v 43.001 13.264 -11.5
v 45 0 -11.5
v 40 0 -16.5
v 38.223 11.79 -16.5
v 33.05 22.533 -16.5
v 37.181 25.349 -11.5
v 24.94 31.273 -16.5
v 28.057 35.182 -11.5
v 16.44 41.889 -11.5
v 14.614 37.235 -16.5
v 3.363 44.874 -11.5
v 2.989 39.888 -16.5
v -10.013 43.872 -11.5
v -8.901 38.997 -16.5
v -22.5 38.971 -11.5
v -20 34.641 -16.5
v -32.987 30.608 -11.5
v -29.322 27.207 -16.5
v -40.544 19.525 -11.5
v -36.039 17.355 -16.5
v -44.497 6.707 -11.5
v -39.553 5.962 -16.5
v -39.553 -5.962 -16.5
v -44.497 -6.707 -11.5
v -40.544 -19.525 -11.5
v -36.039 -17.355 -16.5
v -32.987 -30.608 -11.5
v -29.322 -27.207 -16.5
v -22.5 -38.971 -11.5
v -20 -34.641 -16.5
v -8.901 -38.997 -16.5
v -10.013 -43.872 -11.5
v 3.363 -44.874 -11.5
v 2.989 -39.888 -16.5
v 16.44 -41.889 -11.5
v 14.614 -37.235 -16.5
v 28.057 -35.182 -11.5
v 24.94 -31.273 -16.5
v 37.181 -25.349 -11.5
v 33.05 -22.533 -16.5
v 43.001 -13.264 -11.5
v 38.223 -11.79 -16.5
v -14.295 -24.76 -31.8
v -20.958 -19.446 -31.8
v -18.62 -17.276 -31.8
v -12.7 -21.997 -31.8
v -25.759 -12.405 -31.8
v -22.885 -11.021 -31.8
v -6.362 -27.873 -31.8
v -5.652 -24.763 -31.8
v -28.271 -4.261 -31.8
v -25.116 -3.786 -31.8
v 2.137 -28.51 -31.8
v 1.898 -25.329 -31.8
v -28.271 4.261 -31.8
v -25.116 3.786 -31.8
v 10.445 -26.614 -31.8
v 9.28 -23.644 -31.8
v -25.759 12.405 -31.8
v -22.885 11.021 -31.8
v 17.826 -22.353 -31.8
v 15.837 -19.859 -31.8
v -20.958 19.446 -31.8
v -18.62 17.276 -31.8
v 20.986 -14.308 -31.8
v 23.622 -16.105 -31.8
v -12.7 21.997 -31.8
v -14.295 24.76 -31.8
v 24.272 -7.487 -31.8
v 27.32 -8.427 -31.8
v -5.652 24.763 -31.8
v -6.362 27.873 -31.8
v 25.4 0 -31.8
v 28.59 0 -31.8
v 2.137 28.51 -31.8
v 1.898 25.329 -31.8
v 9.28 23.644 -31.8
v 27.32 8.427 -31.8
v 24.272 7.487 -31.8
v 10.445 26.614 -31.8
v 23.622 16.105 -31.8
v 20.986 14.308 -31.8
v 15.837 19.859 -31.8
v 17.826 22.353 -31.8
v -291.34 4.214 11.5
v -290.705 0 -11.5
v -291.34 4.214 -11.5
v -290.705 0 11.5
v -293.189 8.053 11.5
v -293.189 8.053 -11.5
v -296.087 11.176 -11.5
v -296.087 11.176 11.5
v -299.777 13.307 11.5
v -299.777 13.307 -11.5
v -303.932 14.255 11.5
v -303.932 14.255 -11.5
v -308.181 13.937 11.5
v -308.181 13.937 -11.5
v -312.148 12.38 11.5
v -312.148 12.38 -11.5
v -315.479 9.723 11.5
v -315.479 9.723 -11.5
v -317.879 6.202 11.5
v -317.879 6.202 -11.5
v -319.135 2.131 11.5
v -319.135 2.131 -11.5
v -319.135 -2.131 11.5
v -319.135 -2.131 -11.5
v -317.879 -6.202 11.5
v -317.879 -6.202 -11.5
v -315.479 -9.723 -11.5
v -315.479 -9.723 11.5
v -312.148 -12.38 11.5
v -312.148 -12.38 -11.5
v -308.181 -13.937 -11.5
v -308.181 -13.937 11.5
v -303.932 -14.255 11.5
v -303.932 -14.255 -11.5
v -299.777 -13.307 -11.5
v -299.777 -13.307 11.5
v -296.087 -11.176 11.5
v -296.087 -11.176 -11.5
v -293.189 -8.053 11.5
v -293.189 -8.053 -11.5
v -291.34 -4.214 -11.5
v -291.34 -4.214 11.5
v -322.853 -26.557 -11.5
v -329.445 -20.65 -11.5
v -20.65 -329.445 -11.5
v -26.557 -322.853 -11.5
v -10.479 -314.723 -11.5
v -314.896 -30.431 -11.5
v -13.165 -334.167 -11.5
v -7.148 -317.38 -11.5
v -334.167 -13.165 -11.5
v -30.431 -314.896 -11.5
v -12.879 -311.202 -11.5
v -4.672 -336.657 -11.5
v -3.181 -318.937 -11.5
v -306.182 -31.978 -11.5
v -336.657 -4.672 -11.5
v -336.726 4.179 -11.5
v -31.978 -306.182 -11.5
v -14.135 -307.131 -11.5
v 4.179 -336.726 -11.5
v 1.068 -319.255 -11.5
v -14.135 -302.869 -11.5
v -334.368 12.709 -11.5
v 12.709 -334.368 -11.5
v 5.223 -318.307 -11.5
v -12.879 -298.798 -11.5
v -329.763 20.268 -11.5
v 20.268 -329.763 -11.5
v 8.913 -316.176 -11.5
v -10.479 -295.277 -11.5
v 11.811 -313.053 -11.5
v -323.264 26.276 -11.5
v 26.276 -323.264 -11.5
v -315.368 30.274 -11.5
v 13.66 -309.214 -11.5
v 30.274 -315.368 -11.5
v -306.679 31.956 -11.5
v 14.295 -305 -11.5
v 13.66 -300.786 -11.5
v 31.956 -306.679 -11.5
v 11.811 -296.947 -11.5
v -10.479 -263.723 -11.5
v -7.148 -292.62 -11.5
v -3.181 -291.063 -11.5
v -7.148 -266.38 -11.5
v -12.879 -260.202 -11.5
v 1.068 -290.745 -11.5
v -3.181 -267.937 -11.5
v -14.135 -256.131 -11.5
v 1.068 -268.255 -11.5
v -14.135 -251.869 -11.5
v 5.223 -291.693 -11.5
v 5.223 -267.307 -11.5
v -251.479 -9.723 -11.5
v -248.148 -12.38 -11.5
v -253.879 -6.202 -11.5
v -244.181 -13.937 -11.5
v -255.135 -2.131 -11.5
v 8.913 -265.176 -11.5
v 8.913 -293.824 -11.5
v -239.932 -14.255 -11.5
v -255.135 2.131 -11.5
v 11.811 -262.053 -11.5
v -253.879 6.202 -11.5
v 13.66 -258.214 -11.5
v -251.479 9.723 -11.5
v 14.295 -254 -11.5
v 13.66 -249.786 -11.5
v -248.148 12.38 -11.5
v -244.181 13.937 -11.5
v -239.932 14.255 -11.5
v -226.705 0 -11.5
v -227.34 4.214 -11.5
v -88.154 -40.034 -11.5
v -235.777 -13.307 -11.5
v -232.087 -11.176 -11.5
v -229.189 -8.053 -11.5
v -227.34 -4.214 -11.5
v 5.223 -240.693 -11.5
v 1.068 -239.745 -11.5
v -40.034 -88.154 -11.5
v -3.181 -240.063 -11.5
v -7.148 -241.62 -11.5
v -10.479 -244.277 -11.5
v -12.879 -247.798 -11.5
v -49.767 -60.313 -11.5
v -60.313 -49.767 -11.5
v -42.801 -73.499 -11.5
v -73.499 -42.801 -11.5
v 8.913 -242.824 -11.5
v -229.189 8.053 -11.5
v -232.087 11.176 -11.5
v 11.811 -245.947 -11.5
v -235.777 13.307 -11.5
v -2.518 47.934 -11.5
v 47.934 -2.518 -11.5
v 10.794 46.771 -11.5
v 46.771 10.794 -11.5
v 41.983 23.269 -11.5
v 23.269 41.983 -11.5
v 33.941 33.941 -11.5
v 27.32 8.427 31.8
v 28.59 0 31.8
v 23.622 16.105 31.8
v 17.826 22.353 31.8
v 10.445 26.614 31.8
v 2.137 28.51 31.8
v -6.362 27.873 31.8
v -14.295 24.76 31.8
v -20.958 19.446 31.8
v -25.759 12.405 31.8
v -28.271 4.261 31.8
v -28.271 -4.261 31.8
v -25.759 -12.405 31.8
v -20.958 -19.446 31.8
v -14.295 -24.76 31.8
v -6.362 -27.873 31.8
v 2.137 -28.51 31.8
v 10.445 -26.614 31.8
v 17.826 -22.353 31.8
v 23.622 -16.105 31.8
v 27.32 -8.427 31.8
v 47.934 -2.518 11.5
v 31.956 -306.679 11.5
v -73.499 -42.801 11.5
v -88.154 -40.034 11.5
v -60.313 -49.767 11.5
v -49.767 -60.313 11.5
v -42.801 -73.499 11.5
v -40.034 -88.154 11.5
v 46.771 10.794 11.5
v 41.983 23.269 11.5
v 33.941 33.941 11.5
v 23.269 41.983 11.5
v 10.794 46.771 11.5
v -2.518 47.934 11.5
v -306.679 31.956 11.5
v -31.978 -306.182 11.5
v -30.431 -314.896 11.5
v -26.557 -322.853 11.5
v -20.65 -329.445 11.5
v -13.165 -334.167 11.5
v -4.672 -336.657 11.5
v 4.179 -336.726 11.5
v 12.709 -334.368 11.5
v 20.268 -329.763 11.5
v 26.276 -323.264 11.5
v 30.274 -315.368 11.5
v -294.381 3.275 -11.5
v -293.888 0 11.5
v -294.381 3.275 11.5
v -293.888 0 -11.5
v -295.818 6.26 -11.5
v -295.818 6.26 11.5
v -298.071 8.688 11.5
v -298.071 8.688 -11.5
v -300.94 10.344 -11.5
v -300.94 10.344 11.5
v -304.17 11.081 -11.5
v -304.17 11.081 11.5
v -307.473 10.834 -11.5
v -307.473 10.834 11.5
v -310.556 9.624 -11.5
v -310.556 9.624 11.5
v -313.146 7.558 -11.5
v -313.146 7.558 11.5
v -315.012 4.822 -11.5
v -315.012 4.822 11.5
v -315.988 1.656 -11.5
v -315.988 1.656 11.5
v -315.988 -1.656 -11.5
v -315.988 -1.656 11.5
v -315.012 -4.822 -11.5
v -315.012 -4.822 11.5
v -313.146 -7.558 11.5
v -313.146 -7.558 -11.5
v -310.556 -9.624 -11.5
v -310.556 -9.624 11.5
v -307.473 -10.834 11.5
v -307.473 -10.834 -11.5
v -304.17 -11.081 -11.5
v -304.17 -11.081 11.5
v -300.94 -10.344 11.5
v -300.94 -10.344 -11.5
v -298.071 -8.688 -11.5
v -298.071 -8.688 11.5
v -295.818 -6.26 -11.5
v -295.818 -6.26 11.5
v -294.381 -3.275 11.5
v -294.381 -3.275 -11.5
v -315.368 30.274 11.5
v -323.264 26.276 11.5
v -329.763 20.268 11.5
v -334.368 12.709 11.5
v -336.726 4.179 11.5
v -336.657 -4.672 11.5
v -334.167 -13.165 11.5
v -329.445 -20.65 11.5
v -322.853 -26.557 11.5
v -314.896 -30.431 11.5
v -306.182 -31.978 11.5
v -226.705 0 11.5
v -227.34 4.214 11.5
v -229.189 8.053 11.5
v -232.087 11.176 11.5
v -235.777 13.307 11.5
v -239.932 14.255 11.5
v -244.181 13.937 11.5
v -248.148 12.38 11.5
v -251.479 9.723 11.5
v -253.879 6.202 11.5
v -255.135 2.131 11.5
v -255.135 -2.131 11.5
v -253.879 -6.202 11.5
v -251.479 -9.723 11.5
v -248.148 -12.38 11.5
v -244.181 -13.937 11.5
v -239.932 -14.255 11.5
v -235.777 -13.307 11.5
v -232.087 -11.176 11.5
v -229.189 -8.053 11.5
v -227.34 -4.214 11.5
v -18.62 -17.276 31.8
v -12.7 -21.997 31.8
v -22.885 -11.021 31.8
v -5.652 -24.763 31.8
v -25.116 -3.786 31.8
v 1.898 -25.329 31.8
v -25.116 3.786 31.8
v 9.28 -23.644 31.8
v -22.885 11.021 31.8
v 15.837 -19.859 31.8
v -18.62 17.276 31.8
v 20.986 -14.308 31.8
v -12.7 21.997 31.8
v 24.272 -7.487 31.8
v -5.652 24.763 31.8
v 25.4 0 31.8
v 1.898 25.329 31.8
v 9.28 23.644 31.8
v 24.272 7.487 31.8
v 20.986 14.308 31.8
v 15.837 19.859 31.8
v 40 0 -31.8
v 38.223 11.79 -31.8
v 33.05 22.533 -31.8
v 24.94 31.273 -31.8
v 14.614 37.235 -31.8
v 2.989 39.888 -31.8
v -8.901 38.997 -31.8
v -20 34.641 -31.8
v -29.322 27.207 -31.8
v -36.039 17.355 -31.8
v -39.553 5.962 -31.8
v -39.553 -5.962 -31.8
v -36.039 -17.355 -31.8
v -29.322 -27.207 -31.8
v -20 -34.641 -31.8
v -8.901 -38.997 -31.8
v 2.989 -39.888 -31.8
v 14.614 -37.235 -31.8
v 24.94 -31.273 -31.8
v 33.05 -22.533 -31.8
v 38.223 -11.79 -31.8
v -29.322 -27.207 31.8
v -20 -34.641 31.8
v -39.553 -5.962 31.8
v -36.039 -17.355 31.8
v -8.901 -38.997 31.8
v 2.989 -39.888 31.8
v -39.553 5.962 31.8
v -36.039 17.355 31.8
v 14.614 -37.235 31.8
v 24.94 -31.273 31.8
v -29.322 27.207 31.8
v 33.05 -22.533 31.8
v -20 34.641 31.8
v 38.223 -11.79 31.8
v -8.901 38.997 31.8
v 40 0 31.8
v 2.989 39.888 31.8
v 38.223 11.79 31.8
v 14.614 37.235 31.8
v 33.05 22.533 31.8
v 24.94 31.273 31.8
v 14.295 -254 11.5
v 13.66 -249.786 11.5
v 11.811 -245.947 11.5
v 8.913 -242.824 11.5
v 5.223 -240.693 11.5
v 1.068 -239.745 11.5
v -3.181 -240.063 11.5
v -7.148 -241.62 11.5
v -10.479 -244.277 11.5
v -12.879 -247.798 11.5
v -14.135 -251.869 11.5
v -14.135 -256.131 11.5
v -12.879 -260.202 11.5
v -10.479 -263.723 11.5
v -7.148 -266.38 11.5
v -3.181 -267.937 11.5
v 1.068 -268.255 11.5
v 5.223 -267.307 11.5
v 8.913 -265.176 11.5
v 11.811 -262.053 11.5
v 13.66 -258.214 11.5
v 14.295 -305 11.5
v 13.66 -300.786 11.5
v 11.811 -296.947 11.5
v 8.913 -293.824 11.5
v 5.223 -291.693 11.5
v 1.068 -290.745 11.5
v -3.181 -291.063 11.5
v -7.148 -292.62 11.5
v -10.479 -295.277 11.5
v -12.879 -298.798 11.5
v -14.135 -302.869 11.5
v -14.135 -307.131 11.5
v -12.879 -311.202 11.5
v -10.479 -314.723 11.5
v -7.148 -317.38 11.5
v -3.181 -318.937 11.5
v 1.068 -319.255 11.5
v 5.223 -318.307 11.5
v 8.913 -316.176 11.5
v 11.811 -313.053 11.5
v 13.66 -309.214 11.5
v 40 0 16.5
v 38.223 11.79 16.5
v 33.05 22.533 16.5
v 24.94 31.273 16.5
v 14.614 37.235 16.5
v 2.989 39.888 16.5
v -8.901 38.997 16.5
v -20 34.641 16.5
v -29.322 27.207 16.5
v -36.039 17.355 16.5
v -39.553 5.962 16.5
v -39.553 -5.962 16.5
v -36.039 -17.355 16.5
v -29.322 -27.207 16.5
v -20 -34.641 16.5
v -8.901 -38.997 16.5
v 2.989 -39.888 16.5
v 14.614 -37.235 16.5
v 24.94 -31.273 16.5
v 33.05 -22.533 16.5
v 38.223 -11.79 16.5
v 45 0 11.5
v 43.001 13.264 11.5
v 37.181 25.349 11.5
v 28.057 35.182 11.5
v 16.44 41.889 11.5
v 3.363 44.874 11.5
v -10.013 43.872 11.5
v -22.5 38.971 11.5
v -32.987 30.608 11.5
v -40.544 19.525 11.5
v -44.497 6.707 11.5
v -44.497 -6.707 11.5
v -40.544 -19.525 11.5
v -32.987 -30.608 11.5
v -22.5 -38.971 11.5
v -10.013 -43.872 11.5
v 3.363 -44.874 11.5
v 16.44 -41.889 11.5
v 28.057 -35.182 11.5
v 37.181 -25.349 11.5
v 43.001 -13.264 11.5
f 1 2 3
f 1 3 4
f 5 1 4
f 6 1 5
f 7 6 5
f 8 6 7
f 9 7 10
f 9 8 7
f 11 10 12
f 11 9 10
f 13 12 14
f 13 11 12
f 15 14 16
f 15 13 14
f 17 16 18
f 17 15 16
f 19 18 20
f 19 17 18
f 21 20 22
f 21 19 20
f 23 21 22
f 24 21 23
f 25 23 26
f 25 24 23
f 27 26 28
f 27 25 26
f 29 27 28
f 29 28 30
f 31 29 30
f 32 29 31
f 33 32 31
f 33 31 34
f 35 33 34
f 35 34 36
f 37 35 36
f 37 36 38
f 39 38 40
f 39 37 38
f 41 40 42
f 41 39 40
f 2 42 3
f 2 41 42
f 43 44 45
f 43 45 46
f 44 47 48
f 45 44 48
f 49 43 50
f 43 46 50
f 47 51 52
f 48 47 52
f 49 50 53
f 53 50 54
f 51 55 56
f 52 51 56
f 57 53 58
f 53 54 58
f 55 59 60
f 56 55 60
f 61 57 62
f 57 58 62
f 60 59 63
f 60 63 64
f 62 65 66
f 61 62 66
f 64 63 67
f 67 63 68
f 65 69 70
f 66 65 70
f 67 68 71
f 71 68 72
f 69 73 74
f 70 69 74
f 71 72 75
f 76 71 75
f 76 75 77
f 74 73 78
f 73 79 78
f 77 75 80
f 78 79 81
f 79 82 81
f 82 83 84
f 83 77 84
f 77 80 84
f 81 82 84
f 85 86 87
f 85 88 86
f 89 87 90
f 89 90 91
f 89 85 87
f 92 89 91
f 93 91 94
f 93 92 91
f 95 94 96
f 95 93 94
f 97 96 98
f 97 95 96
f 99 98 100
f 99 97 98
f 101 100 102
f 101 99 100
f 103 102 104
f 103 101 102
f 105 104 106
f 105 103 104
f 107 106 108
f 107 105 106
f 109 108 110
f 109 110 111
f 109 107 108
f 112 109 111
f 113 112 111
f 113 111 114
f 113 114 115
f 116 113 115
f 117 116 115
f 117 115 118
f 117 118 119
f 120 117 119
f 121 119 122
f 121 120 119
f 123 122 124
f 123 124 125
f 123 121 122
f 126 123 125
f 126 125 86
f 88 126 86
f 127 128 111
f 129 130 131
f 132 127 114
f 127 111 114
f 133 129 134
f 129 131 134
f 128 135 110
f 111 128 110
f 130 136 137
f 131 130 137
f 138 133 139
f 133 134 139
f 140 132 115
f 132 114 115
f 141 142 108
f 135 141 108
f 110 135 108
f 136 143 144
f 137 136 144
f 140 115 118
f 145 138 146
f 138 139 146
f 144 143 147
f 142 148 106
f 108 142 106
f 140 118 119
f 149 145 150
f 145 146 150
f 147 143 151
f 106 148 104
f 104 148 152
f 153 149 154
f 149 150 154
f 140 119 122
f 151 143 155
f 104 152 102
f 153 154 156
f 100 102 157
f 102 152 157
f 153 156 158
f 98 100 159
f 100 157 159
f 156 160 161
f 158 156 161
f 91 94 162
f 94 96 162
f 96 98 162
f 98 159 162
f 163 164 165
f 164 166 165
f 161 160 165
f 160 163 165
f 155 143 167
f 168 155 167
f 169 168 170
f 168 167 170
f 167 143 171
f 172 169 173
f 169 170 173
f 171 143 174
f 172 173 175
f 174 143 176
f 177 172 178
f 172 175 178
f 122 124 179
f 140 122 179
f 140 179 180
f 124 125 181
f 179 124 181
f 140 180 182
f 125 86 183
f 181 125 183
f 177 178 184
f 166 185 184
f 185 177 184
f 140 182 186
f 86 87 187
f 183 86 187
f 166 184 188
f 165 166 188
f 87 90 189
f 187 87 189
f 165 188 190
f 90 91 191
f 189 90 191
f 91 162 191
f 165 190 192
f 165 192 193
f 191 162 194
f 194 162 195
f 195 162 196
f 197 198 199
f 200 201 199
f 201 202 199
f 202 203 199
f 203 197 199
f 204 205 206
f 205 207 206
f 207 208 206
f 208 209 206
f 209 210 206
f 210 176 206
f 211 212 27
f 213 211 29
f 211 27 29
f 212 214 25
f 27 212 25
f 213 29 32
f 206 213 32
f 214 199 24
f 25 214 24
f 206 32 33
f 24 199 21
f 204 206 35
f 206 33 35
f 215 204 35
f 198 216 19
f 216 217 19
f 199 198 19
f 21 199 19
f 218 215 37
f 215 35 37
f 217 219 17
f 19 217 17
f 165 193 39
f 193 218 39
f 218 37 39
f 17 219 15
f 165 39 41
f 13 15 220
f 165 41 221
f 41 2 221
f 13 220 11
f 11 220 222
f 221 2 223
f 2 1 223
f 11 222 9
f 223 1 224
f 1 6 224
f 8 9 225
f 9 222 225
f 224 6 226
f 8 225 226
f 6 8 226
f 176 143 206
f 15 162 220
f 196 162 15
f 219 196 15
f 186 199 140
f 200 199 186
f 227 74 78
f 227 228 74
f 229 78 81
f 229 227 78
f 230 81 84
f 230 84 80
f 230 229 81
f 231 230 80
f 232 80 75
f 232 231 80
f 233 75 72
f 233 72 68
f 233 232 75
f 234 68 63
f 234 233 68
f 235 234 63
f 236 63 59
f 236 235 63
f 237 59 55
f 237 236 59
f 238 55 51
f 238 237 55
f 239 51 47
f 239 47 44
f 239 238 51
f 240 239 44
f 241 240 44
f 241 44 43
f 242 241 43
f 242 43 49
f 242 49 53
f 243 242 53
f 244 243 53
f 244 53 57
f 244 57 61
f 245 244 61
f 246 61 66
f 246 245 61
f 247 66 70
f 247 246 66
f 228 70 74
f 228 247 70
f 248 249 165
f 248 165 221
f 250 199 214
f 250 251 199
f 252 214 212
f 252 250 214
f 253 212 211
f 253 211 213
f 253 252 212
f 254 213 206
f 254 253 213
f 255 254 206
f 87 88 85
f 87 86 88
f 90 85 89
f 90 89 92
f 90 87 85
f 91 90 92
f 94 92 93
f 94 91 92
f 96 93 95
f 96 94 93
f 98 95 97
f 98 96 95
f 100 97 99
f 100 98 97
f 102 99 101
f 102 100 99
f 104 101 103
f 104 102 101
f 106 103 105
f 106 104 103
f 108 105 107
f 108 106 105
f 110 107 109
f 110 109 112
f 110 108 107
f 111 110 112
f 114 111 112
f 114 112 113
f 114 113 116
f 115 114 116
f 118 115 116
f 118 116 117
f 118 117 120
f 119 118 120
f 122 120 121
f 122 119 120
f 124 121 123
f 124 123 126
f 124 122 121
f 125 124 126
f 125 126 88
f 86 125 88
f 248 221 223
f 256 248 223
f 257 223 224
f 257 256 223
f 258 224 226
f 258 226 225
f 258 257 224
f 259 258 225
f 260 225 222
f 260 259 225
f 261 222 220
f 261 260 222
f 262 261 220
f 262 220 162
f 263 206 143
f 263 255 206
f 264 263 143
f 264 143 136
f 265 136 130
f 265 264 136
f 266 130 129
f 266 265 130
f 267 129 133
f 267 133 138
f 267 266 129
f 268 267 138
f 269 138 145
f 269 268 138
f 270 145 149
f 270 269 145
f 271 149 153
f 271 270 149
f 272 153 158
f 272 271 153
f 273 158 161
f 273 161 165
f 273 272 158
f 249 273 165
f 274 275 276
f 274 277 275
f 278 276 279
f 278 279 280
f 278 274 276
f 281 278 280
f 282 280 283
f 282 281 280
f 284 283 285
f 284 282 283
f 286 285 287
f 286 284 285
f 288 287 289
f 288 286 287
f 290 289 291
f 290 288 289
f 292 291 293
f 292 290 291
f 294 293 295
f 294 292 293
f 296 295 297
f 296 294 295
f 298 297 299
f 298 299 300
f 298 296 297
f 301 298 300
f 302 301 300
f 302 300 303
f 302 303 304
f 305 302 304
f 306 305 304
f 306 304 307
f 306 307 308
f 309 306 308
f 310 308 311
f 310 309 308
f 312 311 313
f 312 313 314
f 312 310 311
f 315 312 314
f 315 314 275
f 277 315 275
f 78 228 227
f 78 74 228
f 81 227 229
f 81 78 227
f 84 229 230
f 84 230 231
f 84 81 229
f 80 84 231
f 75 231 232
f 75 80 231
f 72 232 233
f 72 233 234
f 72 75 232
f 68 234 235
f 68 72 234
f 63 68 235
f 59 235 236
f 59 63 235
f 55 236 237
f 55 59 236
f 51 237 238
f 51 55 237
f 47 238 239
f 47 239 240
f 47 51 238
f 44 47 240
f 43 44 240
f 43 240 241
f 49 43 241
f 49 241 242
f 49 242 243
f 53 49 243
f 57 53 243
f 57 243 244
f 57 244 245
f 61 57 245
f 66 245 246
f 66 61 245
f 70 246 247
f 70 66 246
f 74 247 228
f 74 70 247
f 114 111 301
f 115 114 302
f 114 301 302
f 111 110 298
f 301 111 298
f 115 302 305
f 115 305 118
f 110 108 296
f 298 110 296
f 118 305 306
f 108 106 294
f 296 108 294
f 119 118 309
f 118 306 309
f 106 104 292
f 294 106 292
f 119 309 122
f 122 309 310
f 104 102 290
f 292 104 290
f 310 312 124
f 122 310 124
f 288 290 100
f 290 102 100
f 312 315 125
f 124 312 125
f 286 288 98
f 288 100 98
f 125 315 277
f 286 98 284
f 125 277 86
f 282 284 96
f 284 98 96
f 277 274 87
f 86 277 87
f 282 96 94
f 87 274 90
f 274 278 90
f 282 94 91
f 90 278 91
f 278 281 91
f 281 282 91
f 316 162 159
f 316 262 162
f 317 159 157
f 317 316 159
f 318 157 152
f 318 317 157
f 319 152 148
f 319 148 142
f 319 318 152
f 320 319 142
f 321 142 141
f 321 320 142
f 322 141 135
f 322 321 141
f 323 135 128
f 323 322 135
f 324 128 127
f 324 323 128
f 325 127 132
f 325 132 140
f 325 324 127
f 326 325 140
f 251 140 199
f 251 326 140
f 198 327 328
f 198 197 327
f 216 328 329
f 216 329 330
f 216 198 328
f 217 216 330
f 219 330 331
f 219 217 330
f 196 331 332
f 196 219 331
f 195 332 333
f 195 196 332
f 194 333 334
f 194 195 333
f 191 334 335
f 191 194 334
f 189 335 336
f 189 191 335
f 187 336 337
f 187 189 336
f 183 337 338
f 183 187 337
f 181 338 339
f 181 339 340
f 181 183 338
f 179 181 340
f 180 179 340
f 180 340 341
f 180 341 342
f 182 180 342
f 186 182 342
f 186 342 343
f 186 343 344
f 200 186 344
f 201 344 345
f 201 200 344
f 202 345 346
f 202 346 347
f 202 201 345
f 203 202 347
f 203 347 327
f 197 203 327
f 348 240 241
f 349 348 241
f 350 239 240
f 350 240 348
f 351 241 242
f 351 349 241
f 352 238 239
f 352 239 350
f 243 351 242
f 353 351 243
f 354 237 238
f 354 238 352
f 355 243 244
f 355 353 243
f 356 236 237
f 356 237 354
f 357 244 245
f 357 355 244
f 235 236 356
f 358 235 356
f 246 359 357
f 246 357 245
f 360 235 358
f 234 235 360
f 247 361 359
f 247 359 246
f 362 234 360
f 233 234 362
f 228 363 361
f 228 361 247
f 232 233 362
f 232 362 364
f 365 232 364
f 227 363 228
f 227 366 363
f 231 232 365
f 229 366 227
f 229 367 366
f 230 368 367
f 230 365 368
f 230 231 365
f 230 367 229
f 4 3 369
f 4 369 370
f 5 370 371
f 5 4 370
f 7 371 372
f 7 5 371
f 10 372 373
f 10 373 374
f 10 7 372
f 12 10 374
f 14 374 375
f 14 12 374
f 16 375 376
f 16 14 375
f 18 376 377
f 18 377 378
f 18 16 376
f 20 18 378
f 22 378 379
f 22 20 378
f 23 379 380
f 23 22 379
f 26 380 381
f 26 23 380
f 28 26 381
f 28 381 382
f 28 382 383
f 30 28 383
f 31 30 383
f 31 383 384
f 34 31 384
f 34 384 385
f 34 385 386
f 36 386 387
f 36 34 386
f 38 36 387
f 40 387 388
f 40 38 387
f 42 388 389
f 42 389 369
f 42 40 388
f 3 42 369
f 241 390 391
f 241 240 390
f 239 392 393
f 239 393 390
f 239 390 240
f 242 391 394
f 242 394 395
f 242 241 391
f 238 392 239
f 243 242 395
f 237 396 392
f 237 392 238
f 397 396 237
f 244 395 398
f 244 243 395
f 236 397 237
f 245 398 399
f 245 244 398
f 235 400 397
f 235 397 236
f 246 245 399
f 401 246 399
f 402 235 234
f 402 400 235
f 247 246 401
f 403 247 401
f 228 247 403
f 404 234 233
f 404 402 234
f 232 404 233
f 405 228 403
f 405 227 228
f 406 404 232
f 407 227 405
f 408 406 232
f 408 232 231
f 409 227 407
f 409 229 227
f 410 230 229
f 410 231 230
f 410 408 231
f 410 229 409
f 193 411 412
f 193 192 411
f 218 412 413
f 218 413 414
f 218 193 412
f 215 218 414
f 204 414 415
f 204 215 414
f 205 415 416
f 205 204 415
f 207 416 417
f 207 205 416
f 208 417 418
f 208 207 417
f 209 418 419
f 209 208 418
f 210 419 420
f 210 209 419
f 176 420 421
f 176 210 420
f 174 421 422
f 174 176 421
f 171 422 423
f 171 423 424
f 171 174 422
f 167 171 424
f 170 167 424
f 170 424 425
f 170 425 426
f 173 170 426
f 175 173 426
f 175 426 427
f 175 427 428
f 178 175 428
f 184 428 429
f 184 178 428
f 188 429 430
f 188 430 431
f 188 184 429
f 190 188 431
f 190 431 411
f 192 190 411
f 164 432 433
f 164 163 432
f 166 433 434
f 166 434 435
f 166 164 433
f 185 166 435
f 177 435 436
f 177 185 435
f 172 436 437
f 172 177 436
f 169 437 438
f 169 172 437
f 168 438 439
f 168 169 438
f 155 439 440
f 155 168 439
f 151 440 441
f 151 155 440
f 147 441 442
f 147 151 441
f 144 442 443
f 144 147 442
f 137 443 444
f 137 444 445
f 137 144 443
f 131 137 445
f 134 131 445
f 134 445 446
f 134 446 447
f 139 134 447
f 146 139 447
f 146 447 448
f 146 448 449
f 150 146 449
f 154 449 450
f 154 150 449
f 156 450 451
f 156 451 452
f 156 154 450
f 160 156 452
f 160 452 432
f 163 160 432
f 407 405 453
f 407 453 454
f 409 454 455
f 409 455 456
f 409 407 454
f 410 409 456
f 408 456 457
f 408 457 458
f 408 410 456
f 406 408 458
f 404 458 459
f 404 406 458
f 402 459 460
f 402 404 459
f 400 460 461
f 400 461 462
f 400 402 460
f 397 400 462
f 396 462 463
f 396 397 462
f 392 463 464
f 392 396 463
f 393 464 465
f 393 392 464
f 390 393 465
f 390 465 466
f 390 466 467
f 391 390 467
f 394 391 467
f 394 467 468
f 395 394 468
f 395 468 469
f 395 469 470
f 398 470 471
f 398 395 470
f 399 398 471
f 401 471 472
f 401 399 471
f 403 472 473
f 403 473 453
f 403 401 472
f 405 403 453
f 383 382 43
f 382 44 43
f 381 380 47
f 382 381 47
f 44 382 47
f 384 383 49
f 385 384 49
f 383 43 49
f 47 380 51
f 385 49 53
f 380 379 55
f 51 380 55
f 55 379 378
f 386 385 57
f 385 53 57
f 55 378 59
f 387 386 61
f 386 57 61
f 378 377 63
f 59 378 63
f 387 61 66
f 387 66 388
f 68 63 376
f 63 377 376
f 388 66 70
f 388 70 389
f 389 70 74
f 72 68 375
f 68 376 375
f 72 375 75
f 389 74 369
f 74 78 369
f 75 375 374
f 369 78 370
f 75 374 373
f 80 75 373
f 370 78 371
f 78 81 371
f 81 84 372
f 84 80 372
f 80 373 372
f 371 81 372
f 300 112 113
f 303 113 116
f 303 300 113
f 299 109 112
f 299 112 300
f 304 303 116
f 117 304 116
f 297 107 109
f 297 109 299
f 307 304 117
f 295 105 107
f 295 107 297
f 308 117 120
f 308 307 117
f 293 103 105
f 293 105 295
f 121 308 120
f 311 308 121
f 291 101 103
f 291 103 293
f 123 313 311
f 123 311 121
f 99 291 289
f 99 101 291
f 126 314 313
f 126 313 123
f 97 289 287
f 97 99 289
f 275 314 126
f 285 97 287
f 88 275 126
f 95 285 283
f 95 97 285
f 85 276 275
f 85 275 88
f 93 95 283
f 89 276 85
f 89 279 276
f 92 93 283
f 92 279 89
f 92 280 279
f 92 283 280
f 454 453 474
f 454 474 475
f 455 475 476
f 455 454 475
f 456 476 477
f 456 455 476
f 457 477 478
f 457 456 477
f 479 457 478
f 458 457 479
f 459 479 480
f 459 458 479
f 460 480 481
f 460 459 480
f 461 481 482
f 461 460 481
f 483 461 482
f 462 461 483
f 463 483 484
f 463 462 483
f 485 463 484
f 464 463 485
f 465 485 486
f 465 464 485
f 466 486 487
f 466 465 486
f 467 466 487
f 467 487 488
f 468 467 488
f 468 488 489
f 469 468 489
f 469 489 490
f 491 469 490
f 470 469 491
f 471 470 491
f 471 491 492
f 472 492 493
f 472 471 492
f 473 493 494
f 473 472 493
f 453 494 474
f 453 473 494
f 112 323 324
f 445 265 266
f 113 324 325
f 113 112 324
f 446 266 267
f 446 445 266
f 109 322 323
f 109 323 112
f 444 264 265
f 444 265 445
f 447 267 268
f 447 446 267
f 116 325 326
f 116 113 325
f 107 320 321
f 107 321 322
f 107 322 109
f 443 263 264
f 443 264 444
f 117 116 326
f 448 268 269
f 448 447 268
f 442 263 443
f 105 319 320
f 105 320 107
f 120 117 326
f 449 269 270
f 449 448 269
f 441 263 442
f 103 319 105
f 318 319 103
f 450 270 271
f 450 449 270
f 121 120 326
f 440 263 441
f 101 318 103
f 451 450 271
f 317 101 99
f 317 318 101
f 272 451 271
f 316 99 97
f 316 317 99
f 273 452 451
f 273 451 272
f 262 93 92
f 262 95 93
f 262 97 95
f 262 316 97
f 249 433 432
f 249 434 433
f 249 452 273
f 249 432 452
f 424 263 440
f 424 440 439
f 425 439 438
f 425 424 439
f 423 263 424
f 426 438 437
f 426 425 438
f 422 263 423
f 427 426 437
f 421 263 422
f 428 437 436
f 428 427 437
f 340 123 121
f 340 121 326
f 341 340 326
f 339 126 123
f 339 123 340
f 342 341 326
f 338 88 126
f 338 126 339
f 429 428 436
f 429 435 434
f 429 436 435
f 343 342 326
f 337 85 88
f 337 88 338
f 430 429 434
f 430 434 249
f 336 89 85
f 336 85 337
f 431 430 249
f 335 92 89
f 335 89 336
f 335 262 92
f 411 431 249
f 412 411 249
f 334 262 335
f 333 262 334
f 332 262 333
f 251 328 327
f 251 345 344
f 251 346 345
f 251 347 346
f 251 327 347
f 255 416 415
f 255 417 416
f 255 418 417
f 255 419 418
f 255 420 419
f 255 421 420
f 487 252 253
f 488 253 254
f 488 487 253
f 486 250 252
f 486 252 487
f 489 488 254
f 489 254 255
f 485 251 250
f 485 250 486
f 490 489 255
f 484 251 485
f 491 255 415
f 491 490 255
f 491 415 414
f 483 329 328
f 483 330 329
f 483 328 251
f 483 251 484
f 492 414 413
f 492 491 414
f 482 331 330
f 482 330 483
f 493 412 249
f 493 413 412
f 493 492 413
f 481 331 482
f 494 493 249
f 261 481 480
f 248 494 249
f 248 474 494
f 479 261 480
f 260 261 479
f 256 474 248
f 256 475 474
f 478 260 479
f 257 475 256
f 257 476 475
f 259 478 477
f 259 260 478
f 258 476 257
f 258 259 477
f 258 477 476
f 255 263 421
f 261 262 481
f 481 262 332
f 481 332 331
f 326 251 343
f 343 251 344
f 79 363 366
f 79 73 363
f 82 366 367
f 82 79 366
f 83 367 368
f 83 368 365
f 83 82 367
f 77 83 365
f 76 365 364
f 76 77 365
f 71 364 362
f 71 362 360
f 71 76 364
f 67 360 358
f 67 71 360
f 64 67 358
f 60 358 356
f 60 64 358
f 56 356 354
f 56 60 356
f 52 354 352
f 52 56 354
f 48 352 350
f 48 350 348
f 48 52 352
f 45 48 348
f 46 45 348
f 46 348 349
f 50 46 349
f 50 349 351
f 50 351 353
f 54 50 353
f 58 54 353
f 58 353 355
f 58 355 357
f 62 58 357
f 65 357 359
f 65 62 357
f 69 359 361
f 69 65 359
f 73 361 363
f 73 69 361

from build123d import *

# Parameters (mm, degrees)
F0_R     = 14.295
F0_R_2   = 40
F1_DEPTH = 11.5
F0_R_3   = 28.59
F2_DEPTH = 31.8
F3_SIZE  = 5
F0_R_4   = 11.1125
F4_DEPTH = 11.5
F0_R_5   = 25.4
F5_DEPTH = 31.8


with BuildPart() as f1:
    # F0 (on Top) → F1 (new body, symmetric)
    with BuildSketch(Plane.XY):
        with BuildLine():
            Line((-40.034096, -88.153808), (-31.978179, -306.181563))
            ThreePointArc((-31.978179, -306.181563), (-0.248811, -336.999033), (31.955938, -306.678689))
            Line((31.955938, -306.678689), (47.933908, -2.518033))
            ThreePointArc((47.933908, -2.518033), (33.941125, 33.941125), (-2.518033, 47.933908))
            Line((-2.518033, 47.933908), (-306.678689, 31.955938))
            ThreePointArc((-306.678689, 31.955938), (-336.999033, -0.248811), (-306.181563, -31.978179))
            Line((-306.181563, -31.978179), (-88.153808, -40.034096))
            ThreePointArc((-88.153808, -40.034096), (-54.644661, -54.644661), (-40.034096, -88.153808))
        make_face()
        with Locations((0, -305)):
            Circle(F0_R, mode=Mode.SUBTRACT)
        with Locations((0, -254)):
            Circle(F0_R, mode=Mode.SUBTRACT)
        with Locations((-305, 0)):
            Circle(F0_R, mode=Mode.SUBTRACT)
        with Locations((-241, 0)):
            Circle(F0_R, mode=Mode.SUBTRACT)
        Circle(F0_R_2, mode=Mode.SUBTRACT)
    extrude(amount=F1_DEPTH, both=True)

    # F0 (on Top) → F2 (join, symmetric)
    with BuildSketch(Plane.XY):
        Circle(F0_R_2)
        Circle(F0_R_3, mode=Mode.SUBTRACT)
    extrude(amount=F2_DEPTH, both=True)

    # F3
    f3_edges = [f1.edges().sort_by_distance(p)[0] for p in [
        (-40, 0, -11.5),
        (-40, 0, 11.5),
    ]]
    chamfer(f3_edges, length=F3_SIZE)


with BuildPart() as f4:
    # F0 (on Top) → F4 (new body, symmetric)
    with BuildSketch(Plane.XY):
        with Locations((-305, 0)):
            Circle(F0_R)
        with Locations((-305, 0)):
            Circle(F0_R_4, mode=Mode.SUBTRACT)
    extrude(amount=F4_DEPTH, both=True)


with BuildPart() as f5:
    # F0 (on Top) → F5 (new body, symmetric)
    with BuildSketch(Plane.XY):
        Circle(F0_R_3)
        Circle(F0_R_5, mode=Mode.SUBTRACT)
    extrude(amount=F5_DEPTH, both=True)


solid = Compound([f1.part, f4.part, f5.part])
